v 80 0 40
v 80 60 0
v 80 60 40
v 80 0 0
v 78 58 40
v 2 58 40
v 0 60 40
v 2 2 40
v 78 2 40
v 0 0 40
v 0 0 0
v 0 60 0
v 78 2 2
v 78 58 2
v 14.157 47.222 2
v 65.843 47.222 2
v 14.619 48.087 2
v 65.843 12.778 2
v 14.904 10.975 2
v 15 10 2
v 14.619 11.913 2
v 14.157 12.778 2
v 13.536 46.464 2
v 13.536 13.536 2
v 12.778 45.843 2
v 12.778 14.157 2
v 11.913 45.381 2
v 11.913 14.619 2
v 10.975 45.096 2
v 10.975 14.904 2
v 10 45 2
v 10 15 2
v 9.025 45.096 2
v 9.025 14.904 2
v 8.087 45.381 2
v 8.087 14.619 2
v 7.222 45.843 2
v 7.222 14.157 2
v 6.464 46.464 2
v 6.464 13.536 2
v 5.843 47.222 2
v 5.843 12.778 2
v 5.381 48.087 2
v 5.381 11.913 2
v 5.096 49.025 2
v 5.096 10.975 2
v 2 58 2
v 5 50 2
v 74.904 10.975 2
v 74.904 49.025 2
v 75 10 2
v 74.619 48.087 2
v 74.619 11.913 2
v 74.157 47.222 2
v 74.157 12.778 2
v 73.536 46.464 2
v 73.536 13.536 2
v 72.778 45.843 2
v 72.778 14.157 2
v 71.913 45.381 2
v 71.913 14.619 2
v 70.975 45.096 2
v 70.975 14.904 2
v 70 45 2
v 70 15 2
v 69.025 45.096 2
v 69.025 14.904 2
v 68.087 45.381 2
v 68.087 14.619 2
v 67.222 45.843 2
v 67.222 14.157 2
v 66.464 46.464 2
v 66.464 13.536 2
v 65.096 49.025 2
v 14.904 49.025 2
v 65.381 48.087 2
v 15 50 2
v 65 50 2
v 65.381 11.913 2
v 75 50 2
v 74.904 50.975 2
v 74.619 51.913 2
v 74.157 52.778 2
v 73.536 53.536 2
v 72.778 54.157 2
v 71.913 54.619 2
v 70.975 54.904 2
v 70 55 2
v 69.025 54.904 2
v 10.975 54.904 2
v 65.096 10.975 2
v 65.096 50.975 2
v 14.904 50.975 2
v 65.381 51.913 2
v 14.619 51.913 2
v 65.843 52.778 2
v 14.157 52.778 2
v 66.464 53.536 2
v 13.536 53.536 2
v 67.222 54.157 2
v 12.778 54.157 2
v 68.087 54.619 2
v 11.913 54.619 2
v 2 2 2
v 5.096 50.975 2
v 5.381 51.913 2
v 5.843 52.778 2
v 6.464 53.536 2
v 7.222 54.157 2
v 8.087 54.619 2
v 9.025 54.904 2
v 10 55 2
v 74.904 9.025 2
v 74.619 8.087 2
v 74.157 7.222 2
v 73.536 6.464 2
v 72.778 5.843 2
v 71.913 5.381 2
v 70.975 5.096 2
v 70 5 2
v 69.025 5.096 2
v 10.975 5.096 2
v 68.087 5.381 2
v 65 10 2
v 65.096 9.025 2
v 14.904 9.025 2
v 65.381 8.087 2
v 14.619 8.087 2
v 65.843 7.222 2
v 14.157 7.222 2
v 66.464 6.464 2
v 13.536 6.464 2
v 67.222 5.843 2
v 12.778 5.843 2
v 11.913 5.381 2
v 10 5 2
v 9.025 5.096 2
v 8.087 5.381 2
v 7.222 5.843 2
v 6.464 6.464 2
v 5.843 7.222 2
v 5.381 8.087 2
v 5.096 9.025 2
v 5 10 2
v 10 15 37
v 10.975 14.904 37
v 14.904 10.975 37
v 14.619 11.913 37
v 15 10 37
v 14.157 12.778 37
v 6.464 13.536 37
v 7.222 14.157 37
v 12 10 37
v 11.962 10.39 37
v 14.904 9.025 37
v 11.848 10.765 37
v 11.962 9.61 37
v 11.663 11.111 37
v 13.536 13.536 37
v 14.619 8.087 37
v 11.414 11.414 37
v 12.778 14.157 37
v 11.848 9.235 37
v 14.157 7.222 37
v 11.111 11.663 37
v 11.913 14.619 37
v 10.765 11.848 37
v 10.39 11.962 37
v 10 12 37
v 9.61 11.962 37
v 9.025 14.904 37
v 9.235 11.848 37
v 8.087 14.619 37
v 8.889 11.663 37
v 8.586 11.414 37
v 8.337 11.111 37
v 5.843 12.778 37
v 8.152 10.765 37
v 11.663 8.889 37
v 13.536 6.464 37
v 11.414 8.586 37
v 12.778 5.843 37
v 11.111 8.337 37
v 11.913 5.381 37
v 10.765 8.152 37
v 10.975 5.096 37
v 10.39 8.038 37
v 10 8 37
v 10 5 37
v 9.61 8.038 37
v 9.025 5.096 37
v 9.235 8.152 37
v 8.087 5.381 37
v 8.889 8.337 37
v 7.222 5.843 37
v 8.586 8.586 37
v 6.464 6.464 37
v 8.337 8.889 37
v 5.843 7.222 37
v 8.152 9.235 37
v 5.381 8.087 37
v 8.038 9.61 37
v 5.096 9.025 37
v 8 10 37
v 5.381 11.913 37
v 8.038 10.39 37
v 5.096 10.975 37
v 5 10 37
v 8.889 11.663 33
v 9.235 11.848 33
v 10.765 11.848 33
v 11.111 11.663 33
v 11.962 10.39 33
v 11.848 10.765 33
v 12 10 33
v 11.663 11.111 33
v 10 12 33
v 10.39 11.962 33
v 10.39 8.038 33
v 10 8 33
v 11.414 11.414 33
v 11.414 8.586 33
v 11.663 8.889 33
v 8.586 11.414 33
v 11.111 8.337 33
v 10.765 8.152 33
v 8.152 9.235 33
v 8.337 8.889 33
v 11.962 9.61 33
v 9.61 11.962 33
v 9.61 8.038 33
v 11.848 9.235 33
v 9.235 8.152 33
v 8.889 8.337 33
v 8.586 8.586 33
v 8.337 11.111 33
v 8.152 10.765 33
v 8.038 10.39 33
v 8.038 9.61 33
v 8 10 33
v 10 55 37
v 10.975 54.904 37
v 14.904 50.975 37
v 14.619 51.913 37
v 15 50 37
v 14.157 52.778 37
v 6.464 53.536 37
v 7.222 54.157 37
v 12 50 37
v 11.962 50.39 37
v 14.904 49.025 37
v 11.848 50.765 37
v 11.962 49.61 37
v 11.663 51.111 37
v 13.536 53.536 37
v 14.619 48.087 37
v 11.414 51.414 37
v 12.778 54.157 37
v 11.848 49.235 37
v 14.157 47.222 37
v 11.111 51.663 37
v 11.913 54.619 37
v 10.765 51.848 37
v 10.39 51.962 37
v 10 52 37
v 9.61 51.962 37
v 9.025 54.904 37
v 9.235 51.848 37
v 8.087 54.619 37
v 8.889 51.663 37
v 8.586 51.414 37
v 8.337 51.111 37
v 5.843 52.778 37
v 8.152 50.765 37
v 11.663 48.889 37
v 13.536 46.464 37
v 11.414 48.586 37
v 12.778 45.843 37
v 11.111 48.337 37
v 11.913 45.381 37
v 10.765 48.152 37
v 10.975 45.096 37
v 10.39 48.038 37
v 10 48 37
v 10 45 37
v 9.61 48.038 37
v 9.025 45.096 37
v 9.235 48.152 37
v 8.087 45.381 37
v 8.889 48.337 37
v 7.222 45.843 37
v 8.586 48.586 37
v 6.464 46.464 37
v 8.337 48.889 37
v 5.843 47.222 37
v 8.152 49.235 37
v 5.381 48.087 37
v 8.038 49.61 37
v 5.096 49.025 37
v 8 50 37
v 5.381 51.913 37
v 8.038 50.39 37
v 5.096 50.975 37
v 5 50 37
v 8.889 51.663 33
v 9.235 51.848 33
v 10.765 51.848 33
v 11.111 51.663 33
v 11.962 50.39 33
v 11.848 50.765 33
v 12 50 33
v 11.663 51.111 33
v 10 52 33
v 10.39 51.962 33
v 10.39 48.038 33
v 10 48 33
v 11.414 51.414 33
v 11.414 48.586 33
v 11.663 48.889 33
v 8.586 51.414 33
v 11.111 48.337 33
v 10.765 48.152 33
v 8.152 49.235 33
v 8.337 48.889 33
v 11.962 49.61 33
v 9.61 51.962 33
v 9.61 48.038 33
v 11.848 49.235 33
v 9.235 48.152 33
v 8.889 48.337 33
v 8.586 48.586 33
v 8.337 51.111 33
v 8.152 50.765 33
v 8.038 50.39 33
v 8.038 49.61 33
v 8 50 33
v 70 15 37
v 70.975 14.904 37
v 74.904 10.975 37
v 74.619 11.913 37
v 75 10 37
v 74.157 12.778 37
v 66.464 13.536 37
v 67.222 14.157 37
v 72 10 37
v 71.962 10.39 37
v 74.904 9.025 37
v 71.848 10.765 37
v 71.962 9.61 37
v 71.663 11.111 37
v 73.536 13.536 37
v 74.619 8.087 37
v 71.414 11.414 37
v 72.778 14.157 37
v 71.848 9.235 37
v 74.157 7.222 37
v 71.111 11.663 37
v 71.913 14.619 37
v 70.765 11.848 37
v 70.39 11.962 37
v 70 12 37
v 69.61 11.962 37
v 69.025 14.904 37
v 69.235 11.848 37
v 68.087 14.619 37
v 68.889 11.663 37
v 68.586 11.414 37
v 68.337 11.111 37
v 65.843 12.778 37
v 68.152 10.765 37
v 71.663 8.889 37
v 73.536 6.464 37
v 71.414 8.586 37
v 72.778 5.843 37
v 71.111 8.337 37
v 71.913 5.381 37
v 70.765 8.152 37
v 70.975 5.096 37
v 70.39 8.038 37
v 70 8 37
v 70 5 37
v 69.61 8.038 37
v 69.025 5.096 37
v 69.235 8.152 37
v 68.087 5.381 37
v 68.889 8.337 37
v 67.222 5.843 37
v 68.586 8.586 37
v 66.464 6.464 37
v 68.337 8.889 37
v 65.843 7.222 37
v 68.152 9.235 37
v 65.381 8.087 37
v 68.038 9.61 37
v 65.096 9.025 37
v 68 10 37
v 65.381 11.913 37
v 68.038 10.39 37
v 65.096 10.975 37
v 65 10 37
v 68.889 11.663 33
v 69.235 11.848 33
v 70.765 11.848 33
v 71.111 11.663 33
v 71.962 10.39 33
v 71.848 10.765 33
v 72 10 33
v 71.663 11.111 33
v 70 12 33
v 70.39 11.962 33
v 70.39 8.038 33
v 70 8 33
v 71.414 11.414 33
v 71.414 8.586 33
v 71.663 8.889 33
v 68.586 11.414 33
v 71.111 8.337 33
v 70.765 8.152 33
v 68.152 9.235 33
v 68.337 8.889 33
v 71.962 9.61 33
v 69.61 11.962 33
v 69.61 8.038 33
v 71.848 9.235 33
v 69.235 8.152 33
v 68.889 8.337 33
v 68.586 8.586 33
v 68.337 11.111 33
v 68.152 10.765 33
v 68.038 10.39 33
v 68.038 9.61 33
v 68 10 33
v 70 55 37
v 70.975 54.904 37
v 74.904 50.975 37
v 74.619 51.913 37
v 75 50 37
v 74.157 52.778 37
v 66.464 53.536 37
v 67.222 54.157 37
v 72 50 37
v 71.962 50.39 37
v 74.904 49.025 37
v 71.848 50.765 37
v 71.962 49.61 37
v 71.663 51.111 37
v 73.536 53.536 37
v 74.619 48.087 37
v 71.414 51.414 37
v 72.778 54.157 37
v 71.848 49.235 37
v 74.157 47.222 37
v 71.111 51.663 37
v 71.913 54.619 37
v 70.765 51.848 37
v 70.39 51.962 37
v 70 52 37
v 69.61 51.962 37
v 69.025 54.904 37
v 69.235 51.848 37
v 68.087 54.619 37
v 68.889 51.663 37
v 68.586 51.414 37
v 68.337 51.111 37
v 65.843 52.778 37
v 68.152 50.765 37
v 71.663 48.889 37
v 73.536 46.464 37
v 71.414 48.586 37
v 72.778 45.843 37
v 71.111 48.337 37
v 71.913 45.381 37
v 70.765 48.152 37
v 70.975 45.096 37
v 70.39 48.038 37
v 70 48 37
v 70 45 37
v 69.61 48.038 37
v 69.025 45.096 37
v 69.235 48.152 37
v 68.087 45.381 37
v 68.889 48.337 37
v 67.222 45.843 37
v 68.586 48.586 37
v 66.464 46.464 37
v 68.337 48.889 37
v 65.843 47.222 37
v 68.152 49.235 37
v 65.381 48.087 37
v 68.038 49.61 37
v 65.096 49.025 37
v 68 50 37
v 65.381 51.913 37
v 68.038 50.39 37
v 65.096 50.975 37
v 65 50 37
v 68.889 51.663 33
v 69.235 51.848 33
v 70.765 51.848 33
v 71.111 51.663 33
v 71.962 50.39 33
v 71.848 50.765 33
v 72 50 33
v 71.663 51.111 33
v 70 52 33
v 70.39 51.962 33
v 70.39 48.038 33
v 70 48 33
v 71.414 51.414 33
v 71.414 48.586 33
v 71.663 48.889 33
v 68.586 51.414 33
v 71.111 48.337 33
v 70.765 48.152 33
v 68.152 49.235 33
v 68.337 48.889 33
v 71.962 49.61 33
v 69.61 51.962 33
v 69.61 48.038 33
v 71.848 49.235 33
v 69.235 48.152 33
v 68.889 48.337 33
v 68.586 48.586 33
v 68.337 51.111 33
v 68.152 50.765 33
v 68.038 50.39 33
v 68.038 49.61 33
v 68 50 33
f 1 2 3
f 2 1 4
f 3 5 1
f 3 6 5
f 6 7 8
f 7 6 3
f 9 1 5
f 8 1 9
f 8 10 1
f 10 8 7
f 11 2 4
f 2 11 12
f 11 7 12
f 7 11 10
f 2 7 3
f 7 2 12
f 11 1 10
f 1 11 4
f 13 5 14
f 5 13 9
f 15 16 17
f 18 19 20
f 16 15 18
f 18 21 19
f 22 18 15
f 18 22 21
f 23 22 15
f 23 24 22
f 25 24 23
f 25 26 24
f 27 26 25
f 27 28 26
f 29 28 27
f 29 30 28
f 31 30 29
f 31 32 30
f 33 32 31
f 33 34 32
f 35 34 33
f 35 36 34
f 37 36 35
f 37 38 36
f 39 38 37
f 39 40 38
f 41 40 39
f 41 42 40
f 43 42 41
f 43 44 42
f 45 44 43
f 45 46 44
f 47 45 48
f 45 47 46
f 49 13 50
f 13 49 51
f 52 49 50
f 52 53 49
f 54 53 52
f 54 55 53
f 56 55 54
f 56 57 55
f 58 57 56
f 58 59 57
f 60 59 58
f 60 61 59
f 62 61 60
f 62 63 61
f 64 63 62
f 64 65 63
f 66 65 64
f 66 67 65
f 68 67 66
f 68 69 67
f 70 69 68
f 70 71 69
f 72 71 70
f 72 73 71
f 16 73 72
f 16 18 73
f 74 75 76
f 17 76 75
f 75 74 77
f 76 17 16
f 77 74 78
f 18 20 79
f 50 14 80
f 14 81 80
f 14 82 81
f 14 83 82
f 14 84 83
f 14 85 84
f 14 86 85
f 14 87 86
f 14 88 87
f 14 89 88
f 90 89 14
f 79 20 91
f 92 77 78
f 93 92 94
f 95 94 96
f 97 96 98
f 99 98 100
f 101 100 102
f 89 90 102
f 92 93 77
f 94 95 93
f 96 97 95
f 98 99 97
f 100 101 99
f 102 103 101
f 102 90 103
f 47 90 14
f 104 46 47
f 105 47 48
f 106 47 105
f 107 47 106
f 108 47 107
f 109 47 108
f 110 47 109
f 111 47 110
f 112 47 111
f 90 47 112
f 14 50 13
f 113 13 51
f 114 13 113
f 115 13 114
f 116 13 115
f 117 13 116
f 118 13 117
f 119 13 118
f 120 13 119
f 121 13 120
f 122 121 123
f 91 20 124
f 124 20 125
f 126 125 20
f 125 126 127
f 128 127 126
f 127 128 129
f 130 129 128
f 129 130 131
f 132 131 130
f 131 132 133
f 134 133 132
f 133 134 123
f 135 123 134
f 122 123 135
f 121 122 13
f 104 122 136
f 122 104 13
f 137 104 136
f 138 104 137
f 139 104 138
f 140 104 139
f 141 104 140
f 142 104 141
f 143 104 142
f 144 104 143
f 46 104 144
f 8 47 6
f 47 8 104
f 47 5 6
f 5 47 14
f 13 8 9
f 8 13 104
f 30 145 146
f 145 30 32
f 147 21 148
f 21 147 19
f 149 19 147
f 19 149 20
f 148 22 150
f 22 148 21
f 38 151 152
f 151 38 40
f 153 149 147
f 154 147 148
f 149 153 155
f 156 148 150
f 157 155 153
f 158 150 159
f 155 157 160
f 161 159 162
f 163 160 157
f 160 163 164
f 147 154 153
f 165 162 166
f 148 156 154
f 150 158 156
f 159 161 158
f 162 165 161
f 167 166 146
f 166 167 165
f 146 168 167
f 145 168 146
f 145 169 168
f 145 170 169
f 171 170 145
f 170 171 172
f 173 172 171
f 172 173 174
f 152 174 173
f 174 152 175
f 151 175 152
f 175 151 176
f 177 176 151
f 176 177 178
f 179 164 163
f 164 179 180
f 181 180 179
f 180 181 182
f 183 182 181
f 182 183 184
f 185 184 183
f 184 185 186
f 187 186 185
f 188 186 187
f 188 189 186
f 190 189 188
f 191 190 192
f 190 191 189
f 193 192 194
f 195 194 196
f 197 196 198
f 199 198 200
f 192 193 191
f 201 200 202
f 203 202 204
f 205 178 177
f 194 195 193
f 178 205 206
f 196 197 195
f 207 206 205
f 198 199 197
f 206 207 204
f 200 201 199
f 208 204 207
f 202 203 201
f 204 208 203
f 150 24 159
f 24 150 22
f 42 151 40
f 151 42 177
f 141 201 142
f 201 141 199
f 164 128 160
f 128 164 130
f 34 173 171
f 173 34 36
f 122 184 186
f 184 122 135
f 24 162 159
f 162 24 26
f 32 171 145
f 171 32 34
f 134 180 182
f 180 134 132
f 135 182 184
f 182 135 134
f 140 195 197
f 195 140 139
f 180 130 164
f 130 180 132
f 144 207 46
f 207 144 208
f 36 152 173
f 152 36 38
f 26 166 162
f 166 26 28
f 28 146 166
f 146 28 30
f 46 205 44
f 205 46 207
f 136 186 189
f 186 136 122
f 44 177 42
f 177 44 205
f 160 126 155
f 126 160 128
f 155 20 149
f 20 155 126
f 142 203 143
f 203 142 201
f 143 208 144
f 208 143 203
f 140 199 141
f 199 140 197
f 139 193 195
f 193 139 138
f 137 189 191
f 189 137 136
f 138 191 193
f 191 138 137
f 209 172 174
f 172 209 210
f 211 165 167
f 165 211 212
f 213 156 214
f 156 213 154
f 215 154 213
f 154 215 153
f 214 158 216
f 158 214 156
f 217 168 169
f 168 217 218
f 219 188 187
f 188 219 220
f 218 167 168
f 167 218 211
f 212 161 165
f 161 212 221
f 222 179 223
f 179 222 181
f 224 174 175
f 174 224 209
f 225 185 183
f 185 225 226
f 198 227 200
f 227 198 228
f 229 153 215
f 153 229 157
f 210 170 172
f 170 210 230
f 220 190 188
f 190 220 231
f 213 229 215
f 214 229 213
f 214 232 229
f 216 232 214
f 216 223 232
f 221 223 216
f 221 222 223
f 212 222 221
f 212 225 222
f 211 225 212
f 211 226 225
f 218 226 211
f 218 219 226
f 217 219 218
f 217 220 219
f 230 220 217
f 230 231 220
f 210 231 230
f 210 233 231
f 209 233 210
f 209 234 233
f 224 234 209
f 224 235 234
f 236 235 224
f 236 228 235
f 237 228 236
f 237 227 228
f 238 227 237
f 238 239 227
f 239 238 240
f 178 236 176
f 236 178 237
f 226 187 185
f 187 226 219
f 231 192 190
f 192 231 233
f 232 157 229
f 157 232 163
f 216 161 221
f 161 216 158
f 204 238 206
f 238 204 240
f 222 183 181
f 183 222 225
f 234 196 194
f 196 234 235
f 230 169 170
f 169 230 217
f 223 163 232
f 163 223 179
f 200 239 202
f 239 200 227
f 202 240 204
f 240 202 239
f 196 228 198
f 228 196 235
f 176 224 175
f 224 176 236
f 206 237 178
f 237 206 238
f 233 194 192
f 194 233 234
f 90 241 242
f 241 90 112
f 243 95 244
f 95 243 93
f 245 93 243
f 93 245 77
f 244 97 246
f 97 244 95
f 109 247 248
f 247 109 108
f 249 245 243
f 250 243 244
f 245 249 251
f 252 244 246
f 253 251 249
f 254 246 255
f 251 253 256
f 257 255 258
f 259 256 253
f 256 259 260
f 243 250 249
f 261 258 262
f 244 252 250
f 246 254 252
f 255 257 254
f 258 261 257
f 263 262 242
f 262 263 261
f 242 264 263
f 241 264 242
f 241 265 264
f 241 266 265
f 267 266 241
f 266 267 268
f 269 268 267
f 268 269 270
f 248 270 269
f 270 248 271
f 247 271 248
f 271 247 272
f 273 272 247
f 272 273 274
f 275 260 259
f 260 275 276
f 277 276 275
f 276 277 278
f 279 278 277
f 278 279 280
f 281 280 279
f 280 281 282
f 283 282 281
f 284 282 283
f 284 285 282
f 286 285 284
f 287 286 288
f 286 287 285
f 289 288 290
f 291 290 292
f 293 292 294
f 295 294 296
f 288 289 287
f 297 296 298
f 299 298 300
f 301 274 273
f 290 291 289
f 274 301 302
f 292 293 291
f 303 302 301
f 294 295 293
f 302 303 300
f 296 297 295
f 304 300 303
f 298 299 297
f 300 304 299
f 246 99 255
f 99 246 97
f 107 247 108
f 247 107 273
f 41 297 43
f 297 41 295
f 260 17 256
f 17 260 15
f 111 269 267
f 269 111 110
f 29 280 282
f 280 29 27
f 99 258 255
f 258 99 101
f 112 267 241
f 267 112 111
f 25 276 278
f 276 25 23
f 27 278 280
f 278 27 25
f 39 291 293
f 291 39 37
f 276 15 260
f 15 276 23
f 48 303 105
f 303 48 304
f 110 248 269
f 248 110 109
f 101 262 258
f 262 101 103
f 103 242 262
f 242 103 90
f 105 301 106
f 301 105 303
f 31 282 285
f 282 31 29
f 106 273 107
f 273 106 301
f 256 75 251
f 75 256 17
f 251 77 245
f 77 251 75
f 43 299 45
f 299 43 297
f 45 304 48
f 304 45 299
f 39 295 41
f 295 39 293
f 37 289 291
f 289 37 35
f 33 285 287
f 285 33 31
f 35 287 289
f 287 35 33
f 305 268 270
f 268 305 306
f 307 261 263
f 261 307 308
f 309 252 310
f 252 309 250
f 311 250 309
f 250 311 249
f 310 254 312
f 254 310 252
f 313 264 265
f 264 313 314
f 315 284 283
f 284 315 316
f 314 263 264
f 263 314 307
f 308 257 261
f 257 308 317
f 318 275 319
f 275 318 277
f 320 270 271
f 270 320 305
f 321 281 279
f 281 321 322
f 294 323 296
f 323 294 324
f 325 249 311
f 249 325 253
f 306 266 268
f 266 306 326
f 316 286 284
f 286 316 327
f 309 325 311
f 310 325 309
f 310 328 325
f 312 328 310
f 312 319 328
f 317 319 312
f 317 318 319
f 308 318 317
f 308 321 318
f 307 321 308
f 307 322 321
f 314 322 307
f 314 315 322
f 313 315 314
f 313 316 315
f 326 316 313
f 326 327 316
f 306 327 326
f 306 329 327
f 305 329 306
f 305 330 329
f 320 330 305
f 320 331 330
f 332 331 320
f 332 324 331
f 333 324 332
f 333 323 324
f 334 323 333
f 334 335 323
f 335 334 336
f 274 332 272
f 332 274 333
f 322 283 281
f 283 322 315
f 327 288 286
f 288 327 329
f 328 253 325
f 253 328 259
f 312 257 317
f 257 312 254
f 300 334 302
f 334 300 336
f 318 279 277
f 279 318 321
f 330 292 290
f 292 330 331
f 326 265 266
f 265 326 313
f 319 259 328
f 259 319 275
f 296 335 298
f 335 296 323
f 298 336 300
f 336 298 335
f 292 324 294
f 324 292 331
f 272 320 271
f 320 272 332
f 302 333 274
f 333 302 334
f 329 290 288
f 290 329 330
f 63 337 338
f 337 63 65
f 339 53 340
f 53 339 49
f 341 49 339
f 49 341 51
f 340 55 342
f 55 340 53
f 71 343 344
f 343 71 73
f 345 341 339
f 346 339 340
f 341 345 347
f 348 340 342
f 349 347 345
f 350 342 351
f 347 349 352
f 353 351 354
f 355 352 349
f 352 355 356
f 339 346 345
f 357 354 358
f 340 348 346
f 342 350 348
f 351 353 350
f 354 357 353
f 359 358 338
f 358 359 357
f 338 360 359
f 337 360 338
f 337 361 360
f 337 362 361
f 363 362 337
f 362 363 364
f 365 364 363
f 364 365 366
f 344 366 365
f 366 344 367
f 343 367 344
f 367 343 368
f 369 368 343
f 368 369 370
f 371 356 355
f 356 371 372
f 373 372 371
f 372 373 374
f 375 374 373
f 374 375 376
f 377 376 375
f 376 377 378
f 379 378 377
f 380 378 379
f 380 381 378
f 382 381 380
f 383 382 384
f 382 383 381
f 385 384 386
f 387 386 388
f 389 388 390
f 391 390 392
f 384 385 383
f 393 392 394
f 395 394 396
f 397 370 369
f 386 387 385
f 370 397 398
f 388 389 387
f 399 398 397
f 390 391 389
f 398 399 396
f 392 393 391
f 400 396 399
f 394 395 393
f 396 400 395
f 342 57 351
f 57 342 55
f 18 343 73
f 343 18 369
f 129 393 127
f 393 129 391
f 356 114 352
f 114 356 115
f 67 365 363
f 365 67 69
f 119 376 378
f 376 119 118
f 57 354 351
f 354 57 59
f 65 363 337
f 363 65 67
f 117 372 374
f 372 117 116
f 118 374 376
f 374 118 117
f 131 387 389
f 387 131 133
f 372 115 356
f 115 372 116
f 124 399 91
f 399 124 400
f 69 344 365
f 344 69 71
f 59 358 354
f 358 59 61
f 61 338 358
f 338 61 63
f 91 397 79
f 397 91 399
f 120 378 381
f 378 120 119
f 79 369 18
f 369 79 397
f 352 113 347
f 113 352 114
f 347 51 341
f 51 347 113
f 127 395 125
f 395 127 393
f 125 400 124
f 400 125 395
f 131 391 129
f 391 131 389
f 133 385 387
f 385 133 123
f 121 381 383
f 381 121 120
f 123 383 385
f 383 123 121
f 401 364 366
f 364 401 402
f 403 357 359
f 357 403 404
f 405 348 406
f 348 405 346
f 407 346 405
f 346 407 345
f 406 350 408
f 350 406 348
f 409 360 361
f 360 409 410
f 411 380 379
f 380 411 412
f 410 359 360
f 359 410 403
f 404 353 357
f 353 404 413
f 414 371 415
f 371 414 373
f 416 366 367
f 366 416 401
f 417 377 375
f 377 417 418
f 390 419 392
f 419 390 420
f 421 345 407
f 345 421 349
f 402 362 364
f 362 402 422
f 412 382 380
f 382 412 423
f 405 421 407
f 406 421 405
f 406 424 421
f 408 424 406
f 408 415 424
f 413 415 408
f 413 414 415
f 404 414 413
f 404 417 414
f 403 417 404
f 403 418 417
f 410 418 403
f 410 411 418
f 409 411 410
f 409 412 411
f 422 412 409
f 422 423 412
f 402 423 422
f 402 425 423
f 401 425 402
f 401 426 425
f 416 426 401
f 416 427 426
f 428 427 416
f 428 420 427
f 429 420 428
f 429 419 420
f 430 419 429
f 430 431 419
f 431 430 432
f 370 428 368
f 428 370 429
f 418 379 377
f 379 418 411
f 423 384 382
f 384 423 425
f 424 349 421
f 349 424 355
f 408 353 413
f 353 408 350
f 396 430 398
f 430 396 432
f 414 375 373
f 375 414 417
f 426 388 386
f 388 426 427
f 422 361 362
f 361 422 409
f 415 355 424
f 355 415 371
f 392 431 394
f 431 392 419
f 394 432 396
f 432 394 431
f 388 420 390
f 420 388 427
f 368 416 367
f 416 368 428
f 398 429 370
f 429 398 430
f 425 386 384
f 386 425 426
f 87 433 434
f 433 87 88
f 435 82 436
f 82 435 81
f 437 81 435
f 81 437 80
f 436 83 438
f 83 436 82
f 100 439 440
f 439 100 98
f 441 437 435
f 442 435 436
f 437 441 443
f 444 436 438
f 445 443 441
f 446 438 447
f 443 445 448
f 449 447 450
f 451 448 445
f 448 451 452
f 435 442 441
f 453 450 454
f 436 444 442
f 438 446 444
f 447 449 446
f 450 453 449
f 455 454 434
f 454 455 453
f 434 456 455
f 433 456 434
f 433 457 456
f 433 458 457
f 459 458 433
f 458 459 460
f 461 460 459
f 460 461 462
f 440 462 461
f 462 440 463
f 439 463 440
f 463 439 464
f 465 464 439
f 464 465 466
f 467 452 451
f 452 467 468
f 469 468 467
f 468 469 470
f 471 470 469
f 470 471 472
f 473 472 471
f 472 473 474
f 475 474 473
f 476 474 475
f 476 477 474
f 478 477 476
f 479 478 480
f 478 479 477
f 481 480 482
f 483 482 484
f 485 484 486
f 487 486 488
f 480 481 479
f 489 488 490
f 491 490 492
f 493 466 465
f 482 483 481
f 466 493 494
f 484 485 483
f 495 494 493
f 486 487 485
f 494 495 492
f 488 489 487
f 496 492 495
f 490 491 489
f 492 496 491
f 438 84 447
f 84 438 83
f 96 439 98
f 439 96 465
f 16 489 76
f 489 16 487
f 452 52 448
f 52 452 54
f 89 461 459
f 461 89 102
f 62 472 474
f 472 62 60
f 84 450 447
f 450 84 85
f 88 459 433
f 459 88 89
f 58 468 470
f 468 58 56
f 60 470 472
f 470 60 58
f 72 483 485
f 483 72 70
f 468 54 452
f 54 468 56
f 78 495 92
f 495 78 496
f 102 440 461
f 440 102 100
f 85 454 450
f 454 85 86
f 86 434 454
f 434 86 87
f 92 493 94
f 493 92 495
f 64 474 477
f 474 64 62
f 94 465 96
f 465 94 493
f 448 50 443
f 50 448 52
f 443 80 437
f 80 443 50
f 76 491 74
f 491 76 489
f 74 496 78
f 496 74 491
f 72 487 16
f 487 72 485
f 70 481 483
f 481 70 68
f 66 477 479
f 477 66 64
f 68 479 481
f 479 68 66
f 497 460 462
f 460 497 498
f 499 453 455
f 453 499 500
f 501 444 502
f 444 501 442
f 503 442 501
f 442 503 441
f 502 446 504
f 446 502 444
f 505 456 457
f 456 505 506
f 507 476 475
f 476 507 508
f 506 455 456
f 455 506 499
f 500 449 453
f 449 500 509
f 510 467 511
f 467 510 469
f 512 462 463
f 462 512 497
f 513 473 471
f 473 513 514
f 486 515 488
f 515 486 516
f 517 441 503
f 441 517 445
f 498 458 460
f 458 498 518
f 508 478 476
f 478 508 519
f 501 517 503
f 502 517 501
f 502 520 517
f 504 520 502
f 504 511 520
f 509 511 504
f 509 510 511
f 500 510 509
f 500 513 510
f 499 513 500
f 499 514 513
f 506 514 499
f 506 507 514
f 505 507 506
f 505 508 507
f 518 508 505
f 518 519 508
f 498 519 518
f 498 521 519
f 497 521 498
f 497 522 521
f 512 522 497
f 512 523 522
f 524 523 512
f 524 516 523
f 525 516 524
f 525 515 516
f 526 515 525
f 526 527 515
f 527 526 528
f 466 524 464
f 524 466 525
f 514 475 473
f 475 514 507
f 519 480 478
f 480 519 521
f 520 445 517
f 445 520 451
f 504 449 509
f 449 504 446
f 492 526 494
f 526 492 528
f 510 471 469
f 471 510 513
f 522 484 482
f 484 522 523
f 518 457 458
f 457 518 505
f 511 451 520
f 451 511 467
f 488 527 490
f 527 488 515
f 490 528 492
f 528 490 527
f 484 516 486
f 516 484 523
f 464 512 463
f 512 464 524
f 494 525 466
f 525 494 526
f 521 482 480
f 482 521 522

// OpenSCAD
$fn = 32;

// ----------------------------------------------------------------------
// Enclosure box: bosses enclosure
// ----------------------------------------------------------------------

// --- parameters (mm) ---
box_l = 80;               // outer length, X
box_w = 60;               // outer width, Y
box_h = 40;               // outer height
wall_t = 2;               // wall thickness
boss_r = 5;               // corner boss radius
hole_r = 2;               // boss screw hole radius
boss_in = 10;             // boss inset from the corners

inner_h = box_h - wall_t;  // cavity depth
boss_h = inner_h - 2;  // corner boss height

difference() {
  union() {
    difference() {
      cube([box_l, box_w, box_h]);
      translate([wall_t, wall_t, wall_t])
        cube([box_l - 2 * wall_t, box_w - 2 * wall_t, box_h]);
    }
    for (sx = [0, 1], sy = [0, 1])
      translate([sx ? box_l - boss_in : boss_in,
                 sy ? box_w - boss_in : boss_in, wall_t - 1])
        difference() {
          cylinder(r = boss_r, h = boss_h);
          translate([0, 0, boss_h - 4])
            cylinder(r = hole_r, h = 5);
        }
  }
}
